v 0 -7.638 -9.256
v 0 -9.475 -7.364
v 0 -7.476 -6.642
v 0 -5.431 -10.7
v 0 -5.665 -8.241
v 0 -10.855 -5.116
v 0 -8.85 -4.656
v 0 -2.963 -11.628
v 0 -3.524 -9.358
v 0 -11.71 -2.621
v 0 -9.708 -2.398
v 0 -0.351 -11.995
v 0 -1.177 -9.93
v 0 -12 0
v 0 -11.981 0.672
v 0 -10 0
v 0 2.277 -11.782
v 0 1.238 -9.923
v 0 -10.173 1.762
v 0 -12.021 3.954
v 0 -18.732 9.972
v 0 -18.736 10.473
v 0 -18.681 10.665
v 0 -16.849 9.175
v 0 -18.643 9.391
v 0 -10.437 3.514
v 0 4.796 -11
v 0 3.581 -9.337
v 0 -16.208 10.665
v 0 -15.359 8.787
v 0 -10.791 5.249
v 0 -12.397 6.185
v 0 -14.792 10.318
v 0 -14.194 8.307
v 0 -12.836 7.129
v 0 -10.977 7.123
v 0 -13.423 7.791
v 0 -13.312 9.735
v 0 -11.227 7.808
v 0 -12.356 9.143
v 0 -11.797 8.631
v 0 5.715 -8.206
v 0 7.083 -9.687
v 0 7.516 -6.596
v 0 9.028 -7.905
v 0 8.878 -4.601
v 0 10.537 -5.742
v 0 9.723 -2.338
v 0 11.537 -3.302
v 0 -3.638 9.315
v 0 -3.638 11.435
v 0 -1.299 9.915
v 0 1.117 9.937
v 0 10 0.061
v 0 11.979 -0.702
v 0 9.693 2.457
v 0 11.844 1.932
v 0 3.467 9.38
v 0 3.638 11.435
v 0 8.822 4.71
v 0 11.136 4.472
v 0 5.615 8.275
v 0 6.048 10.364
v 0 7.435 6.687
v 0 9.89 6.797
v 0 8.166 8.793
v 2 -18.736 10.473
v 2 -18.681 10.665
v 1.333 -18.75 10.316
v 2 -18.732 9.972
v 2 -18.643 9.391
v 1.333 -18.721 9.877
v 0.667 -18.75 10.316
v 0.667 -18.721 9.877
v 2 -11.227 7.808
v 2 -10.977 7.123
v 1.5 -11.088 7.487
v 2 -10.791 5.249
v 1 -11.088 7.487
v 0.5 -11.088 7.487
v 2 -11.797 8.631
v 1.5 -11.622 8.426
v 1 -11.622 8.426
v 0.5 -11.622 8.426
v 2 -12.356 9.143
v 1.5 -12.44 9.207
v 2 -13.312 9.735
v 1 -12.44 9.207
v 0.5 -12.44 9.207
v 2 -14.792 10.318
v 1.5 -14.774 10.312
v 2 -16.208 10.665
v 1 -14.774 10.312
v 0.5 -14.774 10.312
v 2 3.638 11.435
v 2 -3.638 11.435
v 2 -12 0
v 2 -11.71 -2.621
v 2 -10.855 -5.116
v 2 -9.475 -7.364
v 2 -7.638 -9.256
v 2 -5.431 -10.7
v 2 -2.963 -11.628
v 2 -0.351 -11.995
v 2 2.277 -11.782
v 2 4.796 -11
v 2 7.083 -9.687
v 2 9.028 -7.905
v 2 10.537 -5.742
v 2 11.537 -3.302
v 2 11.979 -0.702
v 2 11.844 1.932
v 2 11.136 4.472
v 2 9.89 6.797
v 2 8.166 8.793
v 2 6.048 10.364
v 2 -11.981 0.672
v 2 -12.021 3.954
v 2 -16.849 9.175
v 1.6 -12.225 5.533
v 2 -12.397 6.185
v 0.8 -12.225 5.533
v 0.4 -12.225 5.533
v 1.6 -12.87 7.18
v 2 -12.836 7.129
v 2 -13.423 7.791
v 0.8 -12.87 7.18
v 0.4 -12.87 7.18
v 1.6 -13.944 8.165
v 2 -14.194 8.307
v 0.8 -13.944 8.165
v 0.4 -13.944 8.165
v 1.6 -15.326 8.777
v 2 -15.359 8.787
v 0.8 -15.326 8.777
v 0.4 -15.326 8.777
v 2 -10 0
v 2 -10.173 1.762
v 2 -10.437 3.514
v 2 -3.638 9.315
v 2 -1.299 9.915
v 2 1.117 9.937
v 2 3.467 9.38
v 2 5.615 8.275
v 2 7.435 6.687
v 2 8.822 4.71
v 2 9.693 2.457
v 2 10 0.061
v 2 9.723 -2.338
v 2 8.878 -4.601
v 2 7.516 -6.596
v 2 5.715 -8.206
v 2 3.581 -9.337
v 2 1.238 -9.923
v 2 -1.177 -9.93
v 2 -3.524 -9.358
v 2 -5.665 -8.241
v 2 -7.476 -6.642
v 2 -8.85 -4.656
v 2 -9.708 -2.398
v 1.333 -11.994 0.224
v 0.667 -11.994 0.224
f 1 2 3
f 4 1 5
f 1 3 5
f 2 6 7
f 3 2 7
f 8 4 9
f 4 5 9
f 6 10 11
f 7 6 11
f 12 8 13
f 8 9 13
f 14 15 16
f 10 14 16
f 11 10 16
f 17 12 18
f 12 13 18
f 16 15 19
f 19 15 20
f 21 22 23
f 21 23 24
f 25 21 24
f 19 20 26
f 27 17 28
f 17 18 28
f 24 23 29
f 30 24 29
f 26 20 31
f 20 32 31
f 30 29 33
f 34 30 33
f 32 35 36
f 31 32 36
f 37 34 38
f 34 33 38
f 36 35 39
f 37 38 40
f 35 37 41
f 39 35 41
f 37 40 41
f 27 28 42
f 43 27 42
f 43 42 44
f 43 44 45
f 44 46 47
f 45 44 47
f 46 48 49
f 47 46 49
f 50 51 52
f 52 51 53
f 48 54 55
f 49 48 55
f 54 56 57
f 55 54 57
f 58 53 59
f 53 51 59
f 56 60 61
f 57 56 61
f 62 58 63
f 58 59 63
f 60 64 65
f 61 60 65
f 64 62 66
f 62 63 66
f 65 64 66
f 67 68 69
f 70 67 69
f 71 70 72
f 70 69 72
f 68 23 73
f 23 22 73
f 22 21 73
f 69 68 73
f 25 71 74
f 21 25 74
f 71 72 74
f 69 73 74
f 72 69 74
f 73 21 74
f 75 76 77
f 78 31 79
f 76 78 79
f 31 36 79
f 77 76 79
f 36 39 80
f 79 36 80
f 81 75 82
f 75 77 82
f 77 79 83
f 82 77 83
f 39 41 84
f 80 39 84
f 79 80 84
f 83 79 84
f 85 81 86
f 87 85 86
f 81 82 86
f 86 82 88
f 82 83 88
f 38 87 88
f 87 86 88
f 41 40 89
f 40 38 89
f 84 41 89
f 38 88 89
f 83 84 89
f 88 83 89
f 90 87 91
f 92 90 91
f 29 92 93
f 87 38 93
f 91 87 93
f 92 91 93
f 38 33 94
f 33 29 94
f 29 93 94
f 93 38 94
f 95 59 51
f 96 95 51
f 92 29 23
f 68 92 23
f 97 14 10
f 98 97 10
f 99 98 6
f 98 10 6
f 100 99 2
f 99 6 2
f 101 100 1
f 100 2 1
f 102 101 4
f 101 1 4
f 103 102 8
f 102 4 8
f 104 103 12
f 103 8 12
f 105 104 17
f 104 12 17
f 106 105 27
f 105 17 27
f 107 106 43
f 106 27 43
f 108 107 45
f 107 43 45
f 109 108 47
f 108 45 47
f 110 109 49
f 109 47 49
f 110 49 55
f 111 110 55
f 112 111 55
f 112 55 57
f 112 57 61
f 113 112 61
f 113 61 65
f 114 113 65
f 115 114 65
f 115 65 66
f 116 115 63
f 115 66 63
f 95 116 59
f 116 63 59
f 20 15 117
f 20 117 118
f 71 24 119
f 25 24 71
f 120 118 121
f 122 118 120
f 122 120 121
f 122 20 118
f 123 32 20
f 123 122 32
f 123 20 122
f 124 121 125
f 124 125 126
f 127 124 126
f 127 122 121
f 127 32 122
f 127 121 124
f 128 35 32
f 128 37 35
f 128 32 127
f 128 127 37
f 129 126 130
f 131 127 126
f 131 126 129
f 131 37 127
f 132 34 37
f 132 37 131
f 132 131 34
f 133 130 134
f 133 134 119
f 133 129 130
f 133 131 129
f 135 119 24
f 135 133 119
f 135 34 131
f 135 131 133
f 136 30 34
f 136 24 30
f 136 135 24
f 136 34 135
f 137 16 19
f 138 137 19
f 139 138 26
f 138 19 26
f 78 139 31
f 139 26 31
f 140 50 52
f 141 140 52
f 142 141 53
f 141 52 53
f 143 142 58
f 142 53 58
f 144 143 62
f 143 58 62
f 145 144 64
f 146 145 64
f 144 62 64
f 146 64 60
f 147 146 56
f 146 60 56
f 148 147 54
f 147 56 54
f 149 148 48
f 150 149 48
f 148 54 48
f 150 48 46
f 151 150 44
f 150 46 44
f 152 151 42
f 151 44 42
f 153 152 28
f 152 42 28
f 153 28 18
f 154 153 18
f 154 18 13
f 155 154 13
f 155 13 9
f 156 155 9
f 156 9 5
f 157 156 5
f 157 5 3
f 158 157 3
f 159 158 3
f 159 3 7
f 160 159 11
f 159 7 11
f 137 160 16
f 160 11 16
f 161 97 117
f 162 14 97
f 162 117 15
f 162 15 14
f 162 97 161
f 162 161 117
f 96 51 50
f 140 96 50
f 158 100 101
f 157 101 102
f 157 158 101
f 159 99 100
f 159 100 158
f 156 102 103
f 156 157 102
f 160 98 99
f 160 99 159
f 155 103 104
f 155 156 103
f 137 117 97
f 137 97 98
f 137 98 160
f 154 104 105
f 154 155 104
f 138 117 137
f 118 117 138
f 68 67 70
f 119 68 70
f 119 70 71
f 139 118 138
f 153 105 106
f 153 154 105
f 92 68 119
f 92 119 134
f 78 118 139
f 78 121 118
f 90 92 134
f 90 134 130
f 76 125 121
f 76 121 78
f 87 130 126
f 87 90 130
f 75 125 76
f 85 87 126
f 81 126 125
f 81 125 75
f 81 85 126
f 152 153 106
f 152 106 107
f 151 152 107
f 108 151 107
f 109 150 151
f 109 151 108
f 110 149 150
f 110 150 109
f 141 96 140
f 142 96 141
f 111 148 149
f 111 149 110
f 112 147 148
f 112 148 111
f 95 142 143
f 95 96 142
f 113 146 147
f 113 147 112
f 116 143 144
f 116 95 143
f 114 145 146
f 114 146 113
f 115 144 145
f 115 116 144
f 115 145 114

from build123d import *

# Parameters (mm, degrees)
F1_DEPTH = 2


with BuildPart() as f1:
    # F0 (on Right) → F1 (new body)
    with BuildSketch(Plane.YZ):
        with BuildLine():
            ThreePointArc((-3.6381939636, 9.3146950934), (8.257782379, -5.639949484), (-10, 0))
            ThreePointArc((-10, 0), (-10.2934540428, 2.639788856), (-10.791214382, 5.2487800641))
            add(Edge.make_bspline(
                [(-10.791214382, 5.2487800641), (-10.8154983711, 6.0263408015), (-10.8550299677, 7.5670980598), (-12.3278240582, 9.3781898524), (-14.520874836, 10.293629199), (-15.7277697161, 10.5687391244), (-16.2077791764, 10.6652913886)],
                knots=[0, 0, 0, 0, 0.1757337799, 0.3486956058, 0.5366450397, 0.6536048932, 0.6536048932, 0.6536048932, 0.6536048932], degree=3))
            Line((-16.2077791764, 10.6652913886), (-18.6808016236, 10.6652913886))
            add(Edge.make_bspline(
                [(-18.6808016236, 10.6652913886), (-18.8148572024, 10.3772405868), (-18.7289432635, 9.8841331089), (-18.6430066824, 9.3909176067)],
                knots=[0.8827630608, 0.8827630608, 0.8827630608, 0.8827630608, 1, 1, 1, 1], degree=3))
            add(Edge.make_bspline(
                [(-11.9811552234, 0.6722495916), (-11.9564777557, 1.6261020361), (-11.9298565867, 3.7922413277), (-12.3964002274, 7.4877698942), (-15.2123230374, 8.8798414319), (-17.7170112276, 9.3591077307), (-18.3933537904, 9.3823415089), (-18.6430066824, 9.3909176067)],
                knots=[0.0450488473, 0.0450488473, 0.0450488473, 0.0450488473, 0.2364437545, 0.4744993228, 0.6873004248, 0.8845757201, 1, 1, 1, 1], degree=3))
            add(Edge.make_bspline(
                [(-12, 0), (-11.9934817942, 0.2238701027), (-11.9869635883, 0.4477402053), (-11.9811552234, 0.6722495916)],
                knots=[0, 0, 0, 0, 0.0450488473, 0.0450488473, 0.0450488473, 0.0450488473], degree=3))
            ThreePointArc((-12, 0), (7.0831374558, -9.686545503), (3.6381939636, 11.4351888783))
            Line((3.6381939636, 11.4351888783), (-3.6381939636, 11.4351888783))
            Line((-3.6381939636, 11.4351888783), (-3.6381939636, 9.3146950934))
        make_face()
    extrude(amount=F1_DEPTH)


solid = f1.part
